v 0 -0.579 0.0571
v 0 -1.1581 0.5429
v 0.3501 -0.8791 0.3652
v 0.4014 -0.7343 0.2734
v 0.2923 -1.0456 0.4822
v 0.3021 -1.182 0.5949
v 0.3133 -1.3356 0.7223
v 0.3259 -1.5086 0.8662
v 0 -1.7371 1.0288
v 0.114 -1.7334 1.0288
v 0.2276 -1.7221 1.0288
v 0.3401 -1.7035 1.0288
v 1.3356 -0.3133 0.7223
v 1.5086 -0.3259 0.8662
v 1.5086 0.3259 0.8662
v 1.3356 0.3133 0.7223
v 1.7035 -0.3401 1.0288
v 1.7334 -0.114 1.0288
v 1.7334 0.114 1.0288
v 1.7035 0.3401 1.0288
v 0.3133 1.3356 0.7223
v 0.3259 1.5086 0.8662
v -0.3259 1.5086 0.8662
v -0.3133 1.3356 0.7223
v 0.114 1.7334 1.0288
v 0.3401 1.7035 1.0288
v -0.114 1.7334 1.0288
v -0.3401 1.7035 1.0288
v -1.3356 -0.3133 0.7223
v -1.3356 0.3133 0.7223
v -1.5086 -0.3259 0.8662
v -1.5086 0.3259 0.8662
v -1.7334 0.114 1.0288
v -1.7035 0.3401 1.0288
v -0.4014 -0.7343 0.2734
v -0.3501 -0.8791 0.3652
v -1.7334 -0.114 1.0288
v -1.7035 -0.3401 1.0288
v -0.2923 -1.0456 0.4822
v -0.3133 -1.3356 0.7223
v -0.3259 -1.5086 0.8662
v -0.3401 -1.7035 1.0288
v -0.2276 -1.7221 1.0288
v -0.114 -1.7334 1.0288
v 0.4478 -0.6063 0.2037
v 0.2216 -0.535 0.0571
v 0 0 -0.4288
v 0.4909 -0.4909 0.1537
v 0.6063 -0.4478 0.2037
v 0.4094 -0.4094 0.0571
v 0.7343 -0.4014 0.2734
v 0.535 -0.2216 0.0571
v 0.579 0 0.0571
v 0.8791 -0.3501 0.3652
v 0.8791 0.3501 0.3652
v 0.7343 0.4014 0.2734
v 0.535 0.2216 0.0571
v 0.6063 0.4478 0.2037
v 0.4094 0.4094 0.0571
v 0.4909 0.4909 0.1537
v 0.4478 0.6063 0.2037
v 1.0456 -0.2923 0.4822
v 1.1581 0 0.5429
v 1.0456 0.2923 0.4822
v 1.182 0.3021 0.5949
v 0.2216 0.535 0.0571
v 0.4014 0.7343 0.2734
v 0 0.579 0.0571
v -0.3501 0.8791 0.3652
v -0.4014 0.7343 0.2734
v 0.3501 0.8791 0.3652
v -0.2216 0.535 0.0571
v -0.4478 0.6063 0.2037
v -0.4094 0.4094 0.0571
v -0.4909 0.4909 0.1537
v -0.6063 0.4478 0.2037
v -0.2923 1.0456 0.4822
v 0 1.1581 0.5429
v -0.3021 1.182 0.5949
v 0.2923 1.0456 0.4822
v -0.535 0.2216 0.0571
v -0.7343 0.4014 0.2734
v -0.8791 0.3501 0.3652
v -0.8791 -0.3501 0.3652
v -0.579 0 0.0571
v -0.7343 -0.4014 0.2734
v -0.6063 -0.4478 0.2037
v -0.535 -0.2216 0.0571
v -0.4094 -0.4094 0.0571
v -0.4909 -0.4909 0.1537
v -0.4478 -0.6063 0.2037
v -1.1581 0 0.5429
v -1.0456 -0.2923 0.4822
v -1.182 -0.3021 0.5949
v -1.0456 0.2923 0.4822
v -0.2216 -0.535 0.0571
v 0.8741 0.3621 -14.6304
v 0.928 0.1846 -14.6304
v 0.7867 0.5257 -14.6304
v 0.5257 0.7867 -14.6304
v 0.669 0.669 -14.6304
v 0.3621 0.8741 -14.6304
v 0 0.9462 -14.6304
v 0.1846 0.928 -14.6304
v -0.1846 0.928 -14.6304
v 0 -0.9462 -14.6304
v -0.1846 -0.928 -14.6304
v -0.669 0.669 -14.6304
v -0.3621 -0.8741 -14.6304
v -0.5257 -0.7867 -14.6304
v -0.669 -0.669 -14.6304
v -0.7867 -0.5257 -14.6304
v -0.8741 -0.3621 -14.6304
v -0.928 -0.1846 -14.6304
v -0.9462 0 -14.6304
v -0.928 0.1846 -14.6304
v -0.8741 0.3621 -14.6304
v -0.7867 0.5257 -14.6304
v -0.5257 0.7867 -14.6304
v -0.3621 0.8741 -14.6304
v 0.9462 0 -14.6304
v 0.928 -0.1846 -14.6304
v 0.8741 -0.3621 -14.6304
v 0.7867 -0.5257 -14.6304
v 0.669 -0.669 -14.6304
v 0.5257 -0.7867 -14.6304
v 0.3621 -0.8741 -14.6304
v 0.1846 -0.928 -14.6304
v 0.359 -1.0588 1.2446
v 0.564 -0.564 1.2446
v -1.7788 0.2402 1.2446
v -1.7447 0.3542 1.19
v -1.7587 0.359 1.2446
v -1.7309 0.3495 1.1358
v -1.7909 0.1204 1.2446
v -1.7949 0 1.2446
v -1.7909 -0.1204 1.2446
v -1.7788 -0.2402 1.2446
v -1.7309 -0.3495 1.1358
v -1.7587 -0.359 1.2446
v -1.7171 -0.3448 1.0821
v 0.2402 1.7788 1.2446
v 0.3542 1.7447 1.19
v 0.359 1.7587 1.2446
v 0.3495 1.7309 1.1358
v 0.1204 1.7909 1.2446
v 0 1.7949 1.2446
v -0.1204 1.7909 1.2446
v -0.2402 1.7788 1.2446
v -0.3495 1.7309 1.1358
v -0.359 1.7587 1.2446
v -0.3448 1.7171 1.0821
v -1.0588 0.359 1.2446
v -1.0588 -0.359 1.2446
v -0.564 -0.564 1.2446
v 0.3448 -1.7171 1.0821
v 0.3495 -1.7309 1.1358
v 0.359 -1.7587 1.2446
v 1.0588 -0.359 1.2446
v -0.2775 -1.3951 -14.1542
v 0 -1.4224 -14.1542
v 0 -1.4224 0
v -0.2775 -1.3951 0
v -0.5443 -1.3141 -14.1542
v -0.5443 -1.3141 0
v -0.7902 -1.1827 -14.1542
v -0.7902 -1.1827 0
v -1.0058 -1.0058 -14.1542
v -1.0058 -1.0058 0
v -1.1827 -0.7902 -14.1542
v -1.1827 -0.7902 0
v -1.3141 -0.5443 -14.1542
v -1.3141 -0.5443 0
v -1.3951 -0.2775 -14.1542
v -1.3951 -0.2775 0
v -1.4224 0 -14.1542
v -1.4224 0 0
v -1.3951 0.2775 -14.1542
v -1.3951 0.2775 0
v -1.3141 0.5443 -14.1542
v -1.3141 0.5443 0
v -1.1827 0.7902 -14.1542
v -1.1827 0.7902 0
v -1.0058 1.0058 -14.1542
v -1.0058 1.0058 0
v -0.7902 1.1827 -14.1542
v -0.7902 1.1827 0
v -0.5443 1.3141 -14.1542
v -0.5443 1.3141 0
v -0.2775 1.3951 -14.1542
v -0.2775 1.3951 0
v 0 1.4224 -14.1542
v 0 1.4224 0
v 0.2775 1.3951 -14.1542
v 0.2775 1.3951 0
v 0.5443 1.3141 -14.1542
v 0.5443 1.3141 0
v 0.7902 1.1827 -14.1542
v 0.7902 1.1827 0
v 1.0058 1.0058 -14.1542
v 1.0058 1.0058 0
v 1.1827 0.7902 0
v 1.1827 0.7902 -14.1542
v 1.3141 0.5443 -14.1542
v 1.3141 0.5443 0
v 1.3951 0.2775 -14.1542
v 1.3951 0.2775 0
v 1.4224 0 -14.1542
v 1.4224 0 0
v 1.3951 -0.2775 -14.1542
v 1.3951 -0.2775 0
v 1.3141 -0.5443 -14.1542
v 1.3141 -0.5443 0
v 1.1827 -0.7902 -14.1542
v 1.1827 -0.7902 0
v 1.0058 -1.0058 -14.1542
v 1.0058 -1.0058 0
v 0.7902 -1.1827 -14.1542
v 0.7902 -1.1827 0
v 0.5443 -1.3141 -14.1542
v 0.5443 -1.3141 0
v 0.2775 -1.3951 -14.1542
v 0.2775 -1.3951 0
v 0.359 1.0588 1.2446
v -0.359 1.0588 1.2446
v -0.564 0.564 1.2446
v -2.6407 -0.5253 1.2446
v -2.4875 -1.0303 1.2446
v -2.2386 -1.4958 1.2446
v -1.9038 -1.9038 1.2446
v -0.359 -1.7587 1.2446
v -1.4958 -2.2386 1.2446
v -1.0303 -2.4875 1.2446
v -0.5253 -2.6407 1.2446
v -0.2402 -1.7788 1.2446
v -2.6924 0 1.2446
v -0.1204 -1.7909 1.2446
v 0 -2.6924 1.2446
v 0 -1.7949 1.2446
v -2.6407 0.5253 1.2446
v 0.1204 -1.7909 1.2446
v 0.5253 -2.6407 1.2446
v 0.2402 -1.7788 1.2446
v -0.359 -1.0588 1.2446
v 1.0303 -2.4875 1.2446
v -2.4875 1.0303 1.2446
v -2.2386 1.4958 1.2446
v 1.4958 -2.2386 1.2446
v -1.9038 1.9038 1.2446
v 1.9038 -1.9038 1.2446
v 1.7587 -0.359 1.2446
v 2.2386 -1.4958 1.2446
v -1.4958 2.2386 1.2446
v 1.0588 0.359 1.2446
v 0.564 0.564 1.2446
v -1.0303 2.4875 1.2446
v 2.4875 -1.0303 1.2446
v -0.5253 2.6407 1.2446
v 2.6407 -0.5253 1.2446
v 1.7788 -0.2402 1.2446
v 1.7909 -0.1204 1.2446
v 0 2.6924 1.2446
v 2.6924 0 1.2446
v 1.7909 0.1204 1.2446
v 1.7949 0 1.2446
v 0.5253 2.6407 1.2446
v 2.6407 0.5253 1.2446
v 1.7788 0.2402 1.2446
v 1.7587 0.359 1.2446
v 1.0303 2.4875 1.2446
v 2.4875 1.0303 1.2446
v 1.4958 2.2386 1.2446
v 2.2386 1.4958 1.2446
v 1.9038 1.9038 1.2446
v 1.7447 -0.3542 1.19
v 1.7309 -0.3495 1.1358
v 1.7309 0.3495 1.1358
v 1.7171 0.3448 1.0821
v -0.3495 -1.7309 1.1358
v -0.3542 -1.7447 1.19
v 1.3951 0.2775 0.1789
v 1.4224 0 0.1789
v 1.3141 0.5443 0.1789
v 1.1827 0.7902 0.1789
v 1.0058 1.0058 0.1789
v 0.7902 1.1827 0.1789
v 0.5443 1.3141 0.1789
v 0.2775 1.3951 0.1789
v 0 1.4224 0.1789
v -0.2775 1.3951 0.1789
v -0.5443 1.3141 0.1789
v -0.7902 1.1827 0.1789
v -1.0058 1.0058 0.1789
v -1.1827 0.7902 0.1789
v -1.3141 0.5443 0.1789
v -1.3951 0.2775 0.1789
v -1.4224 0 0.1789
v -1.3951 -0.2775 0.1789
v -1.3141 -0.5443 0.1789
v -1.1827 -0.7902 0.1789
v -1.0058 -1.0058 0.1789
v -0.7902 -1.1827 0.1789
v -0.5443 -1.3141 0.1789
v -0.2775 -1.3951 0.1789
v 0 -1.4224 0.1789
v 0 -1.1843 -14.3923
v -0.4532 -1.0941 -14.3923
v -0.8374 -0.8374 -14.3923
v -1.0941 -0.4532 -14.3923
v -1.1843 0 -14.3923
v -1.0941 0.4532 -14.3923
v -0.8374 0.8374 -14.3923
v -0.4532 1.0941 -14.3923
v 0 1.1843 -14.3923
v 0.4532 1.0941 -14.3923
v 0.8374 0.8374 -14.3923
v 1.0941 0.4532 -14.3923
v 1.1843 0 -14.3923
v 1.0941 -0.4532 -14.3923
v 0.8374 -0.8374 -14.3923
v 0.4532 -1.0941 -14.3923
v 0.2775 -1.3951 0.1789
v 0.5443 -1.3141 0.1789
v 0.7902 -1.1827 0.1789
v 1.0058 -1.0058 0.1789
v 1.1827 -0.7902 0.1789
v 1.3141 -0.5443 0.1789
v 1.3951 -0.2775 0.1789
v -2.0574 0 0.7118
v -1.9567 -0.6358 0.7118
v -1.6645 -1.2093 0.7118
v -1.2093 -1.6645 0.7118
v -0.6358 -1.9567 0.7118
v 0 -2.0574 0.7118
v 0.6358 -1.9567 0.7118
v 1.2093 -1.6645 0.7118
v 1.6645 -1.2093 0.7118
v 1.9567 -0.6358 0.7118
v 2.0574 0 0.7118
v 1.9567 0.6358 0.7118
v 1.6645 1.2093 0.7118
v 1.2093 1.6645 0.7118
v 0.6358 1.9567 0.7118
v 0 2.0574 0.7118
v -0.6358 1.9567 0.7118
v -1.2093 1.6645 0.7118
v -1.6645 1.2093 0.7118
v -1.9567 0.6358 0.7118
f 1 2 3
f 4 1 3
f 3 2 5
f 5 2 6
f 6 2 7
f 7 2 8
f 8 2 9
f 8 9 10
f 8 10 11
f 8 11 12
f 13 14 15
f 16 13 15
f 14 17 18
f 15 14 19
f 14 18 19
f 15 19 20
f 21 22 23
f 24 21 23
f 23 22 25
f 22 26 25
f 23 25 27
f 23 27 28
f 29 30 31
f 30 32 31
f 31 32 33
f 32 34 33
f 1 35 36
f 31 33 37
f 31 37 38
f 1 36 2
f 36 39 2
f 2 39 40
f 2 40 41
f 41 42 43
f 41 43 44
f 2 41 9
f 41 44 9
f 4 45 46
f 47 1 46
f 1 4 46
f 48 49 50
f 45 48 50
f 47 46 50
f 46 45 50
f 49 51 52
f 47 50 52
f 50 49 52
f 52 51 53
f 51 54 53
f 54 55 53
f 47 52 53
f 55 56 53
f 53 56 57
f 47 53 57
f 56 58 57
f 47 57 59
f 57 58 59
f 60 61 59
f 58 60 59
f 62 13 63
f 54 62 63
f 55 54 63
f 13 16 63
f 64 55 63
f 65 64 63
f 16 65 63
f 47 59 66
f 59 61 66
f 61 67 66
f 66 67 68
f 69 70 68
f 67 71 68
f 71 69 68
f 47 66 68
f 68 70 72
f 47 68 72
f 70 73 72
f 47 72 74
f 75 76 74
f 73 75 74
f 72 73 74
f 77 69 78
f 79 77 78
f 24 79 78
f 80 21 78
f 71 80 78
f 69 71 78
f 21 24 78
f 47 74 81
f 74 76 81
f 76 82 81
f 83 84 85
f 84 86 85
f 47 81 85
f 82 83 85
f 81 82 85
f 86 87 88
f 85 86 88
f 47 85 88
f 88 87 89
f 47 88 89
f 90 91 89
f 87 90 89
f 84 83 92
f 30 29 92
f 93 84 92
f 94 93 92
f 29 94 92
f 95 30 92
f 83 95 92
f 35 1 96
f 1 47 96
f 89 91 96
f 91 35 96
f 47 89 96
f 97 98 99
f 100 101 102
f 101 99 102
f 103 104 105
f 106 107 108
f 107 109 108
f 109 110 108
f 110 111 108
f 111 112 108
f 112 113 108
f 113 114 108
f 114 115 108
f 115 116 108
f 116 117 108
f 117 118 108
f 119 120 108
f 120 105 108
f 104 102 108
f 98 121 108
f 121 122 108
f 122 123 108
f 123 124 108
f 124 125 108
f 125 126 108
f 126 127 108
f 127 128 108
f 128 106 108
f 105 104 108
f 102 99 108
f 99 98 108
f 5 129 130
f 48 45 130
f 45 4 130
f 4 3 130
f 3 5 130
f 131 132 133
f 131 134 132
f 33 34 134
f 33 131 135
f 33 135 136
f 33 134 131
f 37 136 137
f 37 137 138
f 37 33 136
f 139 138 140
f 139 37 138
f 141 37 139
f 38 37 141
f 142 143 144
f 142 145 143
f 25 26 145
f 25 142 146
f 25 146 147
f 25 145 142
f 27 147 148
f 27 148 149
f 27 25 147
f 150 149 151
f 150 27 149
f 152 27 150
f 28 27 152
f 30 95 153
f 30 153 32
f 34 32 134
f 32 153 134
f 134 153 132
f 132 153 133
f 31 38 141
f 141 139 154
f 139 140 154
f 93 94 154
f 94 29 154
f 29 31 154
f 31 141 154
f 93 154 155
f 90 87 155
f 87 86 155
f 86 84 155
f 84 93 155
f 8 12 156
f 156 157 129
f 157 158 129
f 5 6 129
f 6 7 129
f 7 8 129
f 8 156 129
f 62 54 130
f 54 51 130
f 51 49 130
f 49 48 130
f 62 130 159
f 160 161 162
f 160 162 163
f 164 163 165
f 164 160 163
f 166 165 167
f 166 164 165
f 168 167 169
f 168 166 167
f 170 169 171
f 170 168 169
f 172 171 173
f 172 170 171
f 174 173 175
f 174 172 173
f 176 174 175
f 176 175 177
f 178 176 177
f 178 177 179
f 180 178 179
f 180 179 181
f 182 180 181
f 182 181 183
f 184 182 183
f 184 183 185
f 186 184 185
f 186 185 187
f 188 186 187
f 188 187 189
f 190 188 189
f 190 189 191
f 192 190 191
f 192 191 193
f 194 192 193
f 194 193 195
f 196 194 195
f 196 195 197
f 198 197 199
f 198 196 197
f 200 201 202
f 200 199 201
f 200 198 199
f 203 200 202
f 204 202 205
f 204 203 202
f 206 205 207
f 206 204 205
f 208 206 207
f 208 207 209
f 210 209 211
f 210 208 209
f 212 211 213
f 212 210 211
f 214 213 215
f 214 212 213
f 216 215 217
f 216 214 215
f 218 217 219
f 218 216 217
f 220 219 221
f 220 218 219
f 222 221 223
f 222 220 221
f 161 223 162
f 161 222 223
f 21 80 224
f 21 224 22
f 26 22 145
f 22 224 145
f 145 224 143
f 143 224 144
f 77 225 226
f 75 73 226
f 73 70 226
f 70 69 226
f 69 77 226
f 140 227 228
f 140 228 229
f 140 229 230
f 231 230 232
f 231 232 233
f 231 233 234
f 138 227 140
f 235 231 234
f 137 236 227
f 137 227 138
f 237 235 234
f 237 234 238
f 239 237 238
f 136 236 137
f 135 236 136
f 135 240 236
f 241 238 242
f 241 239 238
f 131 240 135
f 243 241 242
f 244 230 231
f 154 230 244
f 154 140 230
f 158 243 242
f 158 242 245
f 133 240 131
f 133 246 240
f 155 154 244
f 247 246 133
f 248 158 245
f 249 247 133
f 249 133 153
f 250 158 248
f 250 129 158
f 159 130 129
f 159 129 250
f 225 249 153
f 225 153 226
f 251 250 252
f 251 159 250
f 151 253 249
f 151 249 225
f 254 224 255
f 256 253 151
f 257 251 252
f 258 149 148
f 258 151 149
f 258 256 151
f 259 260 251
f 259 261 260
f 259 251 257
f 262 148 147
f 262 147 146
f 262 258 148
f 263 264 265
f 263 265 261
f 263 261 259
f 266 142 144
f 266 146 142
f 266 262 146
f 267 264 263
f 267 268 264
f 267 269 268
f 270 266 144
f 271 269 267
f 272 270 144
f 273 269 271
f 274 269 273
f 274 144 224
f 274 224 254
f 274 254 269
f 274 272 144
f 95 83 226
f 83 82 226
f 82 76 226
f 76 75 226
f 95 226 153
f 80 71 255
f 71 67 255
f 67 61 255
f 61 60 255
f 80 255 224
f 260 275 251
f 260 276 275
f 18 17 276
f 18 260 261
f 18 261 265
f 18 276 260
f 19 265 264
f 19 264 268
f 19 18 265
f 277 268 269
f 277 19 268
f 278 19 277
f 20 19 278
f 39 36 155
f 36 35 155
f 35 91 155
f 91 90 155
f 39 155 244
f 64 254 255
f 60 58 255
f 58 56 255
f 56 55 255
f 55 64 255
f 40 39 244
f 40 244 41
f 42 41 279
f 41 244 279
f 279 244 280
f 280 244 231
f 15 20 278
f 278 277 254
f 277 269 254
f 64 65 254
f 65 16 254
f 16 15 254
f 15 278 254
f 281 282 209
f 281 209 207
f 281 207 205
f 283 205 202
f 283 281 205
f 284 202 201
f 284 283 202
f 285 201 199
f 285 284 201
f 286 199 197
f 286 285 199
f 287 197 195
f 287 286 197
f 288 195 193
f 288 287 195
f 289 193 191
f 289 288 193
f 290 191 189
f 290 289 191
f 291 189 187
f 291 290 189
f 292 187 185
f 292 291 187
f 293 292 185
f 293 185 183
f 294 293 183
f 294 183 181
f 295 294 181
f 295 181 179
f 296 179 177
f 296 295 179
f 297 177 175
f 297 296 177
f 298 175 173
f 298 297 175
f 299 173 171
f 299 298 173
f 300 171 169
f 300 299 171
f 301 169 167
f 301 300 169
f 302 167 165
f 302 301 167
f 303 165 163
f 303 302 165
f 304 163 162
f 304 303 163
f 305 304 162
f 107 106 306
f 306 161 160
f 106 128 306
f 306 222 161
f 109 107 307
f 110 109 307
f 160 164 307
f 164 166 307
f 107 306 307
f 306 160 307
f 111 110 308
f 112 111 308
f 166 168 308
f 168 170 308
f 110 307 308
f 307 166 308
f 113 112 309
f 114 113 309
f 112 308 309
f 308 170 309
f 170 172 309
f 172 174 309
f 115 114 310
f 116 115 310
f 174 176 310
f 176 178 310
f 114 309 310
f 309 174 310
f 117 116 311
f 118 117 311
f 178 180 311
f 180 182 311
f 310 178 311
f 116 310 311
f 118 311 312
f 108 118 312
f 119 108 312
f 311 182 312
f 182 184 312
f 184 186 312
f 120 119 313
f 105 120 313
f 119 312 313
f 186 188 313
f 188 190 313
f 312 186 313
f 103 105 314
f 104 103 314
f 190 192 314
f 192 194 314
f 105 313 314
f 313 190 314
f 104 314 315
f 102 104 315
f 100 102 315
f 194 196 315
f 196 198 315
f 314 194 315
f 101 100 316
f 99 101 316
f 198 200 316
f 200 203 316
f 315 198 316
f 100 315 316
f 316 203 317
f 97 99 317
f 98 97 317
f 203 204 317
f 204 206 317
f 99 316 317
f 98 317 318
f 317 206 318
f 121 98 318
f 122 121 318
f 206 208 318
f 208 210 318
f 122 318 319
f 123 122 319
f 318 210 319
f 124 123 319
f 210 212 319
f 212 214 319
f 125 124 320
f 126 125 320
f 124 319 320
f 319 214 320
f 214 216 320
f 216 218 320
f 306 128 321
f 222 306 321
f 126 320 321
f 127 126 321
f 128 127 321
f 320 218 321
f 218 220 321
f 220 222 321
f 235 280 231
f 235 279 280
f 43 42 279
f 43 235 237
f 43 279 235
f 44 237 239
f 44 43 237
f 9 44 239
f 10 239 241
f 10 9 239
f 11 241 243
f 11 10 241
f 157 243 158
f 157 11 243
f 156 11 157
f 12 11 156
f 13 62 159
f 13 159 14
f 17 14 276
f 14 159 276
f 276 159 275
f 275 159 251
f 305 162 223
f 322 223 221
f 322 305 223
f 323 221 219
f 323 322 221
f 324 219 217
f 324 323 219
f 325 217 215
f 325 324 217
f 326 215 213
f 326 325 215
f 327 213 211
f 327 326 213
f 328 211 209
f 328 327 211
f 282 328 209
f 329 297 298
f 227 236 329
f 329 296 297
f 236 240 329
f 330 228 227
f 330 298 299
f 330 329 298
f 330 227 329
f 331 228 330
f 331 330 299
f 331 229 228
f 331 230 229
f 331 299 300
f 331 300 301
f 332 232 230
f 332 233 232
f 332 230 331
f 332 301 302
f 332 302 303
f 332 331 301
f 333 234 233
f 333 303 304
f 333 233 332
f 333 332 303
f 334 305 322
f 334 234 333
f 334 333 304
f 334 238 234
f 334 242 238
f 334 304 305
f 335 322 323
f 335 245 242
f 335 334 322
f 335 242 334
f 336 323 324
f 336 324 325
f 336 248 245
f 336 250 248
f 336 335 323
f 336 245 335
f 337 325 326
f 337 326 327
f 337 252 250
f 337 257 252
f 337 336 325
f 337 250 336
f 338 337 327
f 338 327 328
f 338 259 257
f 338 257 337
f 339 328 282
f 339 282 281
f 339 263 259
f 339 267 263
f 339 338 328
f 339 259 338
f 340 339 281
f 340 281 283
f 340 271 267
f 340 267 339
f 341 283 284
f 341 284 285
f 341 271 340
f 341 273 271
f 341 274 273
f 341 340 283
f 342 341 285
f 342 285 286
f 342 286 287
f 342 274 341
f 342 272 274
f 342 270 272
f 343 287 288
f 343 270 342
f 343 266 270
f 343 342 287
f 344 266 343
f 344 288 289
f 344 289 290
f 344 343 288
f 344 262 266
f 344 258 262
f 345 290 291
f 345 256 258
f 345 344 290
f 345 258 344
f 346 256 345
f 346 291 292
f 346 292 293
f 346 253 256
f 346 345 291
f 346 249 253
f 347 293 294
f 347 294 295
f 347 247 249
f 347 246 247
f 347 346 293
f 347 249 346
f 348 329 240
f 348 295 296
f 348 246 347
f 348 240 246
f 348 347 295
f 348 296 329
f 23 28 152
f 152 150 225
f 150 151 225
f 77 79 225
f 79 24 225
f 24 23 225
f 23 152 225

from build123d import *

# Parameters (mm, degrees)
SKETCH1_R          = 2.6924
EXTRUDE3_DEPTH     = 1.2446
SKETCH4_W          = 15.875
SKETCH4_H          = 1.4224
CHAMFER1_SIZE      = 0.47625
SKETCH26_R         = 0.7112
EXTRUDE8_DEPTH     = 1.2446
CUT_EXTRUDE3_REACH = 18.325
CIRPATTERN1_COUNT  = 4
DRAFT2_ANGLE       = 5


# Read off the part's stored shape, not the designer's step: Extrude10, Draft1
with BuildPart() as part:
    # Sketch1 → Extrude3 (new body)
    with BuildSketch(Plane.XY):
        Circle(SKETCH1_R)
    extrude(amount=EXTRUDE3_DEPTH)

    # Sketch11 → Cut-Revolve3 (revolve, cut)
    with BuildSketch(Plane(origin=(0, 0, 0), x_dir=(0, 0, -1), z_dir=(1, 0, 0)), mode=Mode.PRIVATE) as cut_revolve3_sk:
        Polygon((0, 1.209143479), (-1.2446, 2.6924), (0, 2.6924), align=None)
    revolve(cut_revolve3_sk.sketch.rotate(Axis((0, 0, -0.441444004), (0, 0, 1)), 90), axis=Axis((0, 0, -0.441444004), (0, 0, 1)), mode=Mode.SUBTRACT)

    # Extrude10 outline → Extrude10 (revolve)
    with BuildSketch(Plane.XZ):
        Polygon((1.4224, 0), (1.4224, 0.178943468), (1.209143479, 0.178943468), (1.209143479, 0), (0, 0), (0, -1.4224), align=None)
    revolve(axis=Axis((0, 0, 0), (0, 0, 1)))



with BuildPart() as body_2:
    # Sketch4 → Revolve1 (revolve)
    with BuildSketch(Plane(origin=(0, 0, 0), x_dir=(0, 0, -1), z_dir=(1, 0, 0)), mode=Mode.PRIVATE) as revolve1_sk:
        with Locations((6.6929, 0.7112)):
            Rectangle(SKETCH4_W, SKETCH4_H)
    revolve(revolve1_sk.sketch.rotate(Axis((0, 0, 1.2446), (0, 0, -1)), 180), axis=Axis((0, 0, 1.2446), (0, 0, -1)))

    # Chamfer1
    chamfer1_edges = [body_2.edges().sort_by_distance(p)[0] for p in [
        (0, 1.4224, -14.6304),
    ]]
    chamfer(chamfer1_edges, length=CHAMFER1_SIZE)


with BuildPart() as part_1:
    add(part.part)

    add(body_2.part)  # Extrude8 merges body 2
    # Sketch26 → Extrude8 (add)
    with BuildSketch(Plane.XY.offset(1.2446)):
        Circle(SKETCH26_R)
    extrude(amount=-EXTRUDE8_DEPTH)

    # Cut-Extrude3: up to this cone (the profile starts inside it)
    cut_extrude3_end = Plane(origin=(0, 0, 1.2446), z_dir=(0, 0, 1)).offset(-1.673411083) * Cone(1.192e-06, 26.805764308, 22.492705944, align=(Align.CENTER, Align.CENTER, Align.MIN), mode=Mode.PRIVATE)
    # Sketch12 → Cut-Extrude3 (cut, up to the surface)
    with BuildSketch(Plane.XY.offset(1.2446), mode=Mode.PRIVATE) as cut_extrude3_sk1:
        with BuildLine():
            Line((1.758668316, 0.358986667), (1.058827491, 0.358986667))
            Line((1.058827491, 0.358986667), (0.563965298, 0.563965298))
            Line((0.563965298, 0.563965298), (0.358986667, 1.058827491))
            Line((0.358986667, 1.058827491), (0.358986667, 1.758668316))
            ThreePointArc((0.358986667, 1.758668316), (0.180406886, 1.785844066), (0, 1.794933333))
            Line((0, 1.794933333), (0, 0))
            Line((0, 0), (1.794933333, 0))
            ThreePointArc((1.794933333, 0), (1.785844066, 0.180406886), (1.758668316, 0.358986667))
        make_face()
    cut_extrude3_tool1 = extrude(cut_extrude3_sk1.sketch, amount=-CUT_EXTRUDE3_REACH, mode=Mode.PRIVATE) & cut_extrude3_end
    cut_extrude3 = cut_extrude3_tool1.solids().sort_by_distance((1.408748, 0.333602, 1.2446))[0]
    add(cut_extrude3, mode=Mode.SUBTRACT)

    # CirPattern1: Cut-Extrude3 ×4 about axis
    cirpattern1_axis = Axis((0, 0, 0), (0, 0, 1))
    for i in range(1, CIRPATTERN1_COUNT):
        add(cut_extrude3.rotate(cirpattern1_axis, i * 360 / CIRPATTERN1_COUNT), mode=Mode.SUBTRACT)

    # Draft1 outline → Draft1 (revolve)
    with BuildSketch(Plane.XZ):
        Polygon((1.794933333, 1.2446), (1.737108581, 1.028795087), (1.794933333, 1.028795087), align=None)
    revolve(axis=Axis((0, 0, 0), (0, 0, 1)))

    # Draft2
    draft2_faces = [part_1.faces().sort_by_distance(p)[0] for p in [
        (0.358986667, 1.329150829, 0.986428177),
        (0.466729534, 0.798713199, 0.799402029),
        (0.798713199, 0.466729534, 0.799402029),
        (1.329150829, 0.358986667, 0.986428177),
        (1.329150829, -0.358986667, 0.986428177),
        (0.798713199, -0.466729534, 0.799402029),
        (0.466729534, -0.798713199, 0.799402029),
        (0.358986667, -1.329150829, 0.986428177),
        (-0.358986667, -1.329150829, 0.986428177),
        (-0.466729534, -0.798713199, 0.799402029),
        (-0.798713199, -0.466729534, 0.799402029),
        (-1.329150829, -0.358986667, 0.986428177),
        (-1.329150829, 0.358986667, 0.986428177),
        (-0.798713199, 0.466729534, 0.799402029),
        (-0.466729534, 0.798713199, 0.799402029),
        (-0.358986667, 1.329150829, 0.986428177),
    ]]
    draft(draft2_faces, Plane(origin=(0, 1.4224, 1.2446), x_dir=(0, 1, 0), z_dir=(0, 0, 1)), DRAFT2_ANGLE)


solid = part_1.part
